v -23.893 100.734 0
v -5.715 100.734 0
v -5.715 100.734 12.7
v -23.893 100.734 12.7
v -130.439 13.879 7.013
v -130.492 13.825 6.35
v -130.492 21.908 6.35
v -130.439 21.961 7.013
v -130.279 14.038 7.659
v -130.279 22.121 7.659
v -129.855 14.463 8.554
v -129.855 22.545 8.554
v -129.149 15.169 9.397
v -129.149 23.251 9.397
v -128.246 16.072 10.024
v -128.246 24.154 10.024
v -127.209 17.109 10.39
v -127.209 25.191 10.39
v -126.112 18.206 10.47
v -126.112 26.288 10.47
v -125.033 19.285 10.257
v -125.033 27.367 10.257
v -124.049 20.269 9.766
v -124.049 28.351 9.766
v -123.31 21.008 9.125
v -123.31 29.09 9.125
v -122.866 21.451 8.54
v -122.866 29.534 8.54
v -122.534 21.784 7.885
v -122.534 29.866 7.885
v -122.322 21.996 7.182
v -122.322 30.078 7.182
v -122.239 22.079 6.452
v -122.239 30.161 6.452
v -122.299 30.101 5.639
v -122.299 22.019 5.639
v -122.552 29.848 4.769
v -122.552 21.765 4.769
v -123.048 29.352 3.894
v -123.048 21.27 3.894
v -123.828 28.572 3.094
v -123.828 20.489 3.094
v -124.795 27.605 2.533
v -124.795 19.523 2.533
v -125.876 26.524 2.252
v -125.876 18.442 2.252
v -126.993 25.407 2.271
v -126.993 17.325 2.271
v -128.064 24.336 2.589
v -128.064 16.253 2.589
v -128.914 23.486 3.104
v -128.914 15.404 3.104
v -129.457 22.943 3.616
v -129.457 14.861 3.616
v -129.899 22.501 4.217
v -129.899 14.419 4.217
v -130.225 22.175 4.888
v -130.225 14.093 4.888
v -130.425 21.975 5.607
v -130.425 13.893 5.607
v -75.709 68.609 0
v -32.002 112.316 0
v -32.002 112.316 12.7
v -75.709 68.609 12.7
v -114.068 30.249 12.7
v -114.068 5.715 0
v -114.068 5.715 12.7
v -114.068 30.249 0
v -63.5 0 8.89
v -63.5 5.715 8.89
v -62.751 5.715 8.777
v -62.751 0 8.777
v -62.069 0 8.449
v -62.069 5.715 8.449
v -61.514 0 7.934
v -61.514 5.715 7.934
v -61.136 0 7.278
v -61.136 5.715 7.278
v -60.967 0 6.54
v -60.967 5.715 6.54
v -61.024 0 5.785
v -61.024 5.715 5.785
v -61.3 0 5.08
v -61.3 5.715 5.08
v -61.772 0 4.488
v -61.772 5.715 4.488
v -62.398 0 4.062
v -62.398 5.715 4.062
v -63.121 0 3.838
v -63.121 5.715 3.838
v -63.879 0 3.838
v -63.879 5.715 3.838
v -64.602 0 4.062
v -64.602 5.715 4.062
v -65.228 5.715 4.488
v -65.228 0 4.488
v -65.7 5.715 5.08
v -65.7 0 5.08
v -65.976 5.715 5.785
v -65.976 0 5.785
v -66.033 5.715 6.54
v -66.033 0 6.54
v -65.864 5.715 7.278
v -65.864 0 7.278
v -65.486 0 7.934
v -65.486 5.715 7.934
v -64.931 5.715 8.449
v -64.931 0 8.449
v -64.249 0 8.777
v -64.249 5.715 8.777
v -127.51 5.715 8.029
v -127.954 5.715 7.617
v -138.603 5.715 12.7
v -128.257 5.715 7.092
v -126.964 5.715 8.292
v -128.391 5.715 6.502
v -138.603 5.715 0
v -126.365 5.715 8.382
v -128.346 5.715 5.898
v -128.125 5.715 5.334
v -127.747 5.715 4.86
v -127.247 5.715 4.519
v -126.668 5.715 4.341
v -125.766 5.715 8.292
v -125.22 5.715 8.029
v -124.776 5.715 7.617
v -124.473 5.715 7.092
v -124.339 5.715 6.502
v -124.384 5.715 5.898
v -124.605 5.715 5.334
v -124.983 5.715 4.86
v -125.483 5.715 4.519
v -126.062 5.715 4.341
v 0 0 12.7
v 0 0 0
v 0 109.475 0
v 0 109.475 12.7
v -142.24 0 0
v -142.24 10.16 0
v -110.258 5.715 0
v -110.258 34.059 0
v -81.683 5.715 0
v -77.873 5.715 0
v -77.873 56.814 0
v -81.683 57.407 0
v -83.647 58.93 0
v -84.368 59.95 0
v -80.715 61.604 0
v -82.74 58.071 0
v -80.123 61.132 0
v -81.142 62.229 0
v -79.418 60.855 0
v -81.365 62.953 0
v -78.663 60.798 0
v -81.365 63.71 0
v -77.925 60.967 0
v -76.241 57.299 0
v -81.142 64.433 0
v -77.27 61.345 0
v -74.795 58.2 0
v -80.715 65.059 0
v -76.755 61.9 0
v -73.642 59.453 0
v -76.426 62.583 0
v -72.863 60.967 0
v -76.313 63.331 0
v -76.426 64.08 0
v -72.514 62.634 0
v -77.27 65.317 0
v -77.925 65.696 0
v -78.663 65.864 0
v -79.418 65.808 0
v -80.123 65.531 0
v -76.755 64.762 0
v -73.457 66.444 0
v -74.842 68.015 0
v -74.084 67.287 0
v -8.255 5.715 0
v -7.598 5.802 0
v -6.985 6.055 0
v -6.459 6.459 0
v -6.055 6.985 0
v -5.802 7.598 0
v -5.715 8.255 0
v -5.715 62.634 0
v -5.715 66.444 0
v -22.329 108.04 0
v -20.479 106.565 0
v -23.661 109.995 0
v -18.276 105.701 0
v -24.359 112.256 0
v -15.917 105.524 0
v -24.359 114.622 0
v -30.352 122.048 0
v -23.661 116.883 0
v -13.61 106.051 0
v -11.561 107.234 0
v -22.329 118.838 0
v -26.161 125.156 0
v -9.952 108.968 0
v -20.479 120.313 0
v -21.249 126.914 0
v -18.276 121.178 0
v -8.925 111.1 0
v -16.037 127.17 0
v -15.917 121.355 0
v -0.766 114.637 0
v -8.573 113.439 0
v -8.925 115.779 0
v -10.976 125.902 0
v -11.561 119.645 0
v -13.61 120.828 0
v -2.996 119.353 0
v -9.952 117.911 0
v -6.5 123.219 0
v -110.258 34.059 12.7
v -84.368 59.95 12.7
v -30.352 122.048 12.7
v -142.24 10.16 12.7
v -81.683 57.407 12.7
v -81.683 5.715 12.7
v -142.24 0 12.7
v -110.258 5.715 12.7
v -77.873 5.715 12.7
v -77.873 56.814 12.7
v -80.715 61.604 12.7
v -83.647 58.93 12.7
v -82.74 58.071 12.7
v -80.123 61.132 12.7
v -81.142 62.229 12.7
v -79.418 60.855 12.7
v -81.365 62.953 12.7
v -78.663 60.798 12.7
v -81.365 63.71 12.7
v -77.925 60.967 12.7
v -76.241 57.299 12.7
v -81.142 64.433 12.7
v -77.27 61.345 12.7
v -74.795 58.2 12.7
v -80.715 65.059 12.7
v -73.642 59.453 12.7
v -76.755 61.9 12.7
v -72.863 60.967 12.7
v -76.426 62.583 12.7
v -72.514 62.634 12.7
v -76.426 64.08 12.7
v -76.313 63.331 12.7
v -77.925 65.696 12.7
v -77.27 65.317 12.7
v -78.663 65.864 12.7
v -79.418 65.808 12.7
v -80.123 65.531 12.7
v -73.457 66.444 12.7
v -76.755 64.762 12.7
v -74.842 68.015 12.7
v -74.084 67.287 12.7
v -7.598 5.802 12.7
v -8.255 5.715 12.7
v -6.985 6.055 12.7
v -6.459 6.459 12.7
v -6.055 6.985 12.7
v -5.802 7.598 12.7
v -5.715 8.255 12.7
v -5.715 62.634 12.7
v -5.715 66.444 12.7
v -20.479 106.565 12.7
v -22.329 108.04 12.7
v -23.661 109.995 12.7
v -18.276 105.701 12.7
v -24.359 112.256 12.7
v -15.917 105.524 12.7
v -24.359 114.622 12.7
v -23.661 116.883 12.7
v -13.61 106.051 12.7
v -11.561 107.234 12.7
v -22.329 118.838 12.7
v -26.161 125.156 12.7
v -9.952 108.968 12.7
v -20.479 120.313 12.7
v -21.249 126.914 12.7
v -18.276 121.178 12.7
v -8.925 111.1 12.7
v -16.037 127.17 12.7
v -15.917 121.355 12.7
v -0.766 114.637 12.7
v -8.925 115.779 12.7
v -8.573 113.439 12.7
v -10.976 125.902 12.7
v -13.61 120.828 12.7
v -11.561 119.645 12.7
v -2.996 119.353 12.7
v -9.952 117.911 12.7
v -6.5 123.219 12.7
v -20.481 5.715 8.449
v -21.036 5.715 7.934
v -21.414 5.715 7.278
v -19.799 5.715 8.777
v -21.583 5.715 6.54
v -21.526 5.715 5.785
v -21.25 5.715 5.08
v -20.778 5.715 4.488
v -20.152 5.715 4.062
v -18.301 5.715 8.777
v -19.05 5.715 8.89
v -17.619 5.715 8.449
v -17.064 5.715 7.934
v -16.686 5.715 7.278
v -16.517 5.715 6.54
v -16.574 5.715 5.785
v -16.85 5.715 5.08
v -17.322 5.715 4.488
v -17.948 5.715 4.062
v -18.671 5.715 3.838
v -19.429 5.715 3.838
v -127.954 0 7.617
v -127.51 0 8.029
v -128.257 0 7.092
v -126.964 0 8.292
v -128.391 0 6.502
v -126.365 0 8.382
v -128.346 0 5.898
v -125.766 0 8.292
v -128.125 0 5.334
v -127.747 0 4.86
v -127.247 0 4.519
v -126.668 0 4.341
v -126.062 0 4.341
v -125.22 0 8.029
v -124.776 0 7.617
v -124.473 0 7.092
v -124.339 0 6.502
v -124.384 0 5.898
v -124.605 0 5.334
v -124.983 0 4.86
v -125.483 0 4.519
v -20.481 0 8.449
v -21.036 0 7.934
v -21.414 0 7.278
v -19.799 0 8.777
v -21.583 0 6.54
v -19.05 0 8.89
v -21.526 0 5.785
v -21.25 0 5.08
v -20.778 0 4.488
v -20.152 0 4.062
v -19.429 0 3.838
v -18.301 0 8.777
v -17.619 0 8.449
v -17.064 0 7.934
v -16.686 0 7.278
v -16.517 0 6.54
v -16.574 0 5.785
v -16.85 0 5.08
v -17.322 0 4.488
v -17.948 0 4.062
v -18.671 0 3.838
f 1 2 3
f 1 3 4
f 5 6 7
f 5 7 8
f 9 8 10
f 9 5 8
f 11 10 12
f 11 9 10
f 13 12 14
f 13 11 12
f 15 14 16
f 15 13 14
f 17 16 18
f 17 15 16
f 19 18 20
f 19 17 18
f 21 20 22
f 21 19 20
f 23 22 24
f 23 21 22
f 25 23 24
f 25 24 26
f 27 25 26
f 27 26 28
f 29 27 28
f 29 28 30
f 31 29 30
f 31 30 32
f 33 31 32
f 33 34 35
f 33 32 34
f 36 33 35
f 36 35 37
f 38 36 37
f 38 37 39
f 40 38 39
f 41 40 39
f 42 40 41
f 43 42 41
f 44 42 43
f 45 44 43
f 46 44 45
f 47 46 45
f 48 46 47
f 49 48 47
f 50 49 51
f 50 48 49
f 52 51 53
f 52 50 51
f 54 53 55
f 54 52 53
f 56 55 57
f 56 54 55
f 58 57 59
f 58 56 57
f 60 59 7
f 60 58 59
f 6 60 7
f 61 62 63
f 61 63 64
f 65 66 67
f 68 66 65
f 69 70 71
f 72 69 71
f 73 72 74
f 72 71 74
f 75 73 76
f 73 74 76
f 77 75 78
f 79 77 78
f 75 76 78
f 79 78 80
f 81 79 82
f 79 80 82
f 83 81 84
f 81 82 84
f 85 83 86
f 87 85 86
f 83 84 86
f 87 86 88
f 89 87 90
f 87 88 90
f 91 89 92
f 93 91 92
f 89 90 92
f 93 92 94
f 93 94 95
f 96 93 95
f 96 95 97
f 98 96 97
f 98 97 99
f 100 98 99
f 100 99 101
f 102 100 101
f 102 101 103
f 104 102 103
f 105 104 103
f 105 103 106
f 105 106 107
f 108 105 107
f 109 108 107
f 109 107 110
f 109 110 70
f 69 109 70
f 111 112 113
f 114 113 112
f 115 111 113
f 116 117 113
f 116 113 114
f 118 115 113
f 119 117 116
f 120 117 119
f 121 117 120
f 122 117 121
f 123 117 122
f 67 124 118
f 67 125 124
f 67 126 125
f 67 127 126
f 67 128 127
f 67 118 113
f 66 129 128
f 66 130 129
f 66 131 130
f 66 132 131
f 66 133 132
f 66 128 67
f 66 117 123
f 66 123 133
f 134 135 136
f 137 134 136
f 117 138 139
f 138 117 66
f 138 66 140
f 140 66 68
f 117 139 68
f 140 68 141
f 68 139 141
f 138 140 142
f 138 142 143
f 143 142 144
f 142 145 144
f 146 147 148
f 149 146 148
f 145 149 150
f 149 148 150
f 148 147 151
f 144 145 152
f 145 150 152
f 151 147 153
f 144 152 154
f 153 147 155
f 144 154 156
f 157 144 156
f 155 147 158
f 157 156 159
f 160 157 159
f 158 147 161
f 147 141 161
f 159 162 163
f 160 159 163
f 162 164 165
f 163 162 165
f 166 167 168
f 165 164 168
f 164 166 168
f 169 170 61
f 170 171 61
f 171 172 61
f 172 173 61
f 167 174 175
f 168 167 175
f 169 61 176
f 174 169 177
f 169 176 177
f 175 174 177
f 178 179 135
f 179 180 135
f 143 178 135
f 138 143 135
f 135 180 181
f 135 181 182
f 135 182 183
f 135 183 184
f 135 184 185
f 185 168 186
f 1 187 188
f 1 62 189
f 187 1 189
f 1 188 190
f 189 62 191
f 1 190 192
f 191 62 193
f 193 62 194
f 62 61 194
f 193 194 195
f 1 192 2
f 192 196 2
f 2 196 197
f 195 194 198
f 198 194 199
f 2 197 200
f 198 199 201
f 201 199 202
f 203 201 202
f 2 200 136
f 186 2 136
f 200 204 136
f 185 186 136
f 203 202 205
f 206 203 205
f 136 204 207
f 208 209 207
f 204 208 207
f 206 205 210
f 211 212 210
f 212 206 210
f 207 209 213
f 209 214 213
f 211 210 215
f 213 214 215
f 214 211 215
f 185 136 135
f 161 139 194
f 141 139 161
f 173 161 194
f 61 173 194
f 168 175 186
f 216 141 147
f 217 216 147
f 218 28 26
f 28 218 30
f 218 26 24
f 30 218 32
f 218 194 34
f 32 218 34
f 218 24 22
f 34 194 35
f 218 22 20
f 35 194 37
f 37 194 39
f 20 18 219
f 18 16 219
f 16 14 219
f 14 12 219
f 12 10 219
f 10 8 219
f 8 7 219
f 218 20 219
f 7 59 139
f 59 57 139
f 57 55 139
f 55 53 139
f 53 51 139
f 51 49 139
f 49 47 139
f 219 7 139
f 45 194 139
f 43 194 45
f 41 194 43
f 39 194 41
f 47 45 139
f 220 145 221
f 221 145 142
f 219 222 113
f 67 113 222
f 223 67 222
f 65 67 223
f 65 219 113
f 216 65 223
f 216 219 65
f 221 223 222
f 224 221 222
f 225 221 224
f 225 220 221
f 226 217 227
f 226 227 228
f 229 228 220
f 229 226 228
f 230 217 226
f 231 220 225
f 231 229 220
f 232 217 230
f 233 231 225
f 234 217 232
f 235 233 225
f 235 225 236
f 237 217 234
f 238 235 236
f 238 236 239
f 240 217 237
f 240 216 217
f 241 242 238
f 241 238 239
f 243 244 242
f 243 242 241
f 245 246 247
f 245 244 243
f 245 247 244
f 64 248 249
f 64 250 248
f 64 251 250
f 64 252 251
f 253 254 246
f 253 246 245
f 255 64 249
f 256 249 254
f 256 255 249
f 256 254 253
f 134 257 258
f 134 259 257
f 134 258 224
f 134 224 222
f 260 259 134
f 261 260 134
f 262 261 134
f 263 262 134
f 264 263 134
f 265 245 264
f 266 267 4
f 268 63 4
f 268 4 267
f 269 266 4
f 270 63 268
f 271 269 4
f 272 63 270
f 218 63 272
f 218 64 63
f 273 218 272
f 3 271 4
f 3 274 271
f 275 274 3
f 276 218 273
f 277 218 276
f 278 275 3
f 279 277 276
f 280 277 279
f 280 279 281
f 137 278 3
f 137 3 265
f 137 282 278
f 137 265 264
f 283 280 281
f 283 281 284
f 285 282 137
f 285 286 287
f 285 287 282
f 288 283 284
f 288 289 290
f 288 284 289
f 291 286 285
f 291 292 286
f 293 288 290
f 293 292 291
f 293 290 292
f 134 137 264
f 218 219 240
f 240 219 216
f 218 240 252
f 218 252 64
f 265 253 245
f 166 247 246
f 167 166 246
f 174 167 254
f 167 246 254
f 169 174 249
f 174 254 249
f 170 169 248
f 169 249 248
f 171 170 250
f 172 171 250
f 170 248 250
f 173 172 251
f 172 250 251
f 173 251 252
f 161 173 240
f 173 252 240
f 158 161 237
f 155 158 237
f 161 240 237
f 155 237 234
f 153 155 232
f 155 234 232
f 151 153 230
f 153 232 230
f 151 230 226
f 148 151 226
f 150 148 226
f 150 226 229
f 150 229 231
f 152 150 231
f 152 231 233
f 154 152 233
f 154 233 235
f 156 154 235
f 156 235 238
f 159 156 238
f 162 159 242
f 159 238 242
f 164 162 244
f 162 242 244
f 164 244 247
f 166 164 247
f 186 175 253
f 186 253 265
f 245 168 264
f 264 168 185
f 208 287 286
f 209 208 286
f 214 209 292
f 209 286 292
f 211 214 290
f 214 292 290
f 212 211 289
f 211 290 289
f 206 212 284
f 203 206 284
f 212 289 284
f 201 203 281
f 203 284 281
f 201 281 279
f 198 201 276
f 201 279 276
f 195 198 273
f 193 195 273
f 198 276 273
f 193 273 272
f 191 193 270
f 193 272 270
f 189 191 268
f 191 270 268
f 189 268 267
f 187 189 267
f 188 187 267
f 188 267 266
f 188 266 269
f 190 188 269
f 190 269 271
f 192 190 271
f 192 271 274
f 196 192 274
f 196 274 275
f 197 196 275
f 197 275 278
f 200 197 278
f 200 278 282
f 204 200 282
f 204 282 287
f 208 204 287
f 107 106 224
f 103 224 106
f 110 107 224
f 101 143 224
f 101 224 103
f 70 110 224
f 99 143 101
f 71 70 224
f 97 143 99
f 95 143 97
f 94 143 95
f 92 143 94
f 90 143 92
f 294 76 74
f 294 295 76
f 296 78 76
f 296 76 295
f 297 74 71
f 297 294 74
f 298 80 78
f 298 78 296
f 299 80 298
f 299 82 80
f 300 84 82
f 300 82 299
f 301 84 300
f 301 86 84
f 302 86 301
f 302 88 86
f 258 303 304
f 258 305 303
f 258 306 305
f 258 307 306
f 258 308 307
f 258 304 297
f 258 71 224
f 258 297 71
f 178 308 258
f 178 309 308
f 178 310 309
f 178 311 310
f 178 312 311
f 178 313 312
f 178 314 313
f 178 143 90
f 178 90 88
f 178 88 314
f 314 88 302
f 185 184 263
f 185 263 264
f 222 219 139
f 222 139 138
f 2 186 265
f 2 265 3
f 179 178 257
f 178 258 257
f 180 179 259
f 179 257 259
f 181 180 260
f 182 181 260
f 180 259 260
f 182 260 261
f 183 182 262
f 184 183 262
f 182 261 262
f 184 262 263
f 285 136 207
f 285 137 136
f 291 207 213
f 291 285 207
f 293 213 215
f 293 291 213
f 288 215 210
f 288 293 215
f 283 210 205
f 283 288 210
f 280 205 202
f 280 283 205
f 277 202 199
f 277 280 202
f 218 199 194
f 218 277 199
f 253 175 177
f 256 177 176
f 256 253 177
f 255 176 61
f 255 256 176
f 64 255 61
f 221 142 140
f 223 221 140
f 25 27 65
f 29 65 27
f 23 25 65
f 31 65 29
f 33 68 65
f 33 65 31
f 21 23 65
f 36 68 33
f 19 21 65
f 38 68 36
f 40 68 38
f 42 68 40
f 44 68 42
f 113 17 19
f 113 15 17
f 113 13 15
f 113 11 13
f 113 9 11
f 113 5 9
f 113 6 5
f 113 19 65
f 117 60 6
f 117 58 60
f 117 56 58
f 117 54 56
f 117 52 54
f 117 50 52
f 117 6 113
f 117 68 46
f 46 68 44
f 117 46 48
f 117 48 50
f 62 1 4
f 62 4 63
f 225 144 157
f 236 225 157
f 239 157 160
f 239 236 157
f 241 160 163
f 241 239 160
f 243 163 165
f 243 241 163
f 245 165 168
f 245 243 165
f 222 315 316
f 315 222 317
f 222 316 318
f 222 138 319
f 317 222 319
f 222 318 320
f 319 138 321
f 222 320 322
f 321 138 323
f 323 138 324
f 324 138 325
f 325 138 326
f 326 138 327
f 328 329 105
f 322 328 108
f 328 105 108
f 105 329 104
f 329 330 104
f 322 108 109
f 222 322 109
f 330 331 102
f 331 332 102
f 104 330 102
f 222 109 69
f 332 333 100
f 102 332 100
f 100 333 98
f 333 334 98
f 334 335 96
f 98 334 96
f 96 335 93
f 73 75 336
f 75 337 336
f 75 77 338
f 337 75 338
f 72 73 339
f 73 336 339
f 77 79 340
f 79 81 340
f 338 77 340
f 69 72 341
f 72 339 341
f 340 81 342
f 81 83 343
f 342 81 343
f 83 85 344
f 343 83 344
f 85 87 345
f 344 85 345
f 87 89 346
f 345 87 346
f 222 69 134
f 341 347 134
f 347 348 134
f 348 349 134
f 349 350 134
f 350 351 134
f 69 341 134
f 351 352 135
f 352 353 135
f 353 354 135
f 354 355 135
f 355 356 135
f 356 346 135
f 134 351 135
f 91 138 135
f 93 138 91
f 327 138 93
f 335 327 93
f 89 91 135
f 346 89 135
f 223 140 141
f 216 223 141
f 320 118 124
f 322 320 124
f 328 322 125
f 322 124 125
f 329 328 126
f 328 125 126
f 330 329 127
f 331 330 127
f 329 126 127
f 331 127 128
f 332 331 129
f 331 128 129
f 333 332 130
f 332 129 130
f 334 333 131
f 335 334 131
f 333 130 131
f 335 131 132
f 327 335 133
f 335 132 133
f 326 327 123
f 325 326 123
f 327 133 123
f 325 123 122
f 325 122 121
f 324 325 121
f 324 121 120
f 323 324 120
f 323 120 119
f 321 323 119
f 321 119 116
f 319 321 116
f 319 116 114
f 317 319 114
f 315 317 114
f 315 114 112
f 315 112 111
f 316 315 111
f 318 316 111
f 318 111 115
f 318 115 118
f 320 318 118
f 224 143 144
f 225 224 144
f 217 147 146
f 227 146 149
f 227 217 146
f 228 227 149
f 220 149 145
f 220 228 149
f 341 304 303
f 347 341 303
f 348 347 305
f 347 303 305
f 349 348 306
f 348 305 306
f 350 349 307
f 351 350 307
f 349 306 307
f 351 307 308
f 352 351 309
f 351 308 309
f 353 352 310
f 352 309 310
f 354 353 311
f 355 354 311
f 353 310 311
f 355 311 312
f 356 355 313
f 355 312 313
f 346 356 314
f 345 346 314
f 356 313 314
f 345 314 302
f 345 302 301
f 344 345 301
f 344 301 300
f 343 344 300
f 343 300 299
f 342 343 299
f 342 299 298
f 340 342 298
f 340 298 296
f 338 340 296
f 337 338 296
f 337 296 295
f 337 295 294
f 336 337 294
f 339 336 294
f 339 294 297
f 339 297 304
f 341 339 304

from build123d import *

# Parameters (mm, degrees)
BOSS_EXTRUDE1_DEPTH = 12.7
FILLET1_R           = 17.78
SKETCH2_R           = 7.9375
CUT_EXTRUDE1_DEPTH  = 25.4
SKETCH4_W           = 72.158320094
SKETCH4_H           = 56.919449397
CUT_EXTRUDE2_DEPTH  = 24.638
SKETCH5_R           = 2.032
CUT_EXTRUDE3_DEPTH  = 12.7
SKETCH6_R           = 4.1275
CUT_EXTRUDE4_DEPTH  = 32.258
SKETCH7_R           = 2.54
CUT_EXTRUDE5_DEPTH  = 12.7
FILLET2_R           = 2.54
SKETCH8_R           = 6.35
BOSS_EXTRUDE2_DEPTH = 12.7
SKETCH9_R           = 2.54
CUT_EXTRUDE6_DEPTH  = 12.7


with BuildPart() as part:
    # Sketch1 → Boss-Extrude1 (new body)
    with BuildSketch(Plane.XY):
        Polygon((-152.4, 0), (0, 0), (0, 152.4), align=None)
    extrude(amount=BOSS_EXTRUDE1_DEPTH)

    # Fillet1
    fillet1_edges = [part.edges().sort_by_distance(p)[0] for p in [
        (0, 152.4, 6.35),
    ]]
    fillet(fillet1_edges, radius=FILLET1_R)

    # Sketch2 → Cut-Extrude1 (cut)
    with BuildSketch(Plane.XY.offset(12.7)):
        with Locations((-16.51, 113.439359697)):
            Circle(SKETCH2_R)
        Polygon((-142.24, 0), (-152.4, 0), (-142.24, 10.16), align=None)
    extrude(amount=-CUT_EXTRUDE1_DEPTH, mode=Mode.SUBTRACT)

    # Sketch4 → Cut-Extrude2 (cut)
    with BuildSketch(Plane.XY):
        Polygon((-138.602769491, 5.715), (-114.068320094, 5.715), (-114.068320094, 30.249449397), align=None)
        Polygon((-110.258320094, 5.715), (-110.258320094, 34.059449397), (-81.683320094, 62.634449397), (-81.683320094, 5.715), align=None)
        Polygon((-77.873320094, 66.444449397), (-5.715, 66.444449397), (-5.715, 100.734449397), (-23.892955176, 100.734449397), (-32.002166338, 112.315603153), align=None)
        with Locations((-41.794160047, 34.174724699)):
            Rectangle(SKETCH4_W, SKETCH4_H)
    extrude(amount=CUT_EXTRUDE2_DEPTH, mode=Mode.SUBTRACT)

    # Sketch5 → Cut-Extrude3 (cut)
    with BuildSketch(Plane(origin=(0, 5.715, 0), x_dir=(1, 0, 0), z_dir=(0, 1, 0))):
        with Locations((-126.365, -6.35)):
            Circle(SKETCH5_R)
    extrude(amount=-CUT_EXTRUDE3_DEPTH, mode=Mode.SUBTRACT)

    # Sketch6 → Cut-Extrude4 (cut)
    with BuildSketch(Plane(origin=(0, 5.715, 0), x_dir=(1, 0, 0), z_dir=(0, 1, 0))):
        with Locations((-126.365, -6.35)):
            Circle(SKETCH6_R)
    extrude(amount=CUT_EXTRUDE4_DEPTH, mode=Mode.SUBTRACT)

    # Sketch7 → Cut-Extrude5 (cut)
    with BuildSketch(Plane(origin=(0, 5.715, 0), x_dir=(1, 0, 0), z_dir=(0, 1, 0))):
        with Locations((-19.05, -6.35)):
            Circle(SKETCH7_R)
        with Locations((-63.5, -6.35)):
            Circle(SKETCH7_R)
    extrude(amount=-CUT_EXTRUDE5_DEPTH, mode=Mode.SUBTRACT)

    # Fillet2
    fillet2_edges = [part.edges().sort_by_distance(p)[0] for p in [
        (-5.715, 5.715, 6.35),
    ]]
    fillet(fillet2_edges, radius=FILLET2_R)

    # Sketch8 → Boss-Extrude2 (add)
    with BuildSketch(Plane.XY.offset(12.7)):
        with Locations((-78.848031384, 63.088562946)):
            Circle(SKETCH8_R)
    extrude(amount=-BOSS_EXTRUDE2_DEPTH)

    # Sketch9 → Cut-Extrude6 (cut)
    with BuildSketch(Plane.XY.offset(12.7)):
        with Locations((-78.853278111, 63.331259387)):
            Circle(SKETCH9_R)
    extrude(amount=-CUT_EXTRUDE6_DEPTH, mode=Mode.SUBTRACT)


solid = part.part
